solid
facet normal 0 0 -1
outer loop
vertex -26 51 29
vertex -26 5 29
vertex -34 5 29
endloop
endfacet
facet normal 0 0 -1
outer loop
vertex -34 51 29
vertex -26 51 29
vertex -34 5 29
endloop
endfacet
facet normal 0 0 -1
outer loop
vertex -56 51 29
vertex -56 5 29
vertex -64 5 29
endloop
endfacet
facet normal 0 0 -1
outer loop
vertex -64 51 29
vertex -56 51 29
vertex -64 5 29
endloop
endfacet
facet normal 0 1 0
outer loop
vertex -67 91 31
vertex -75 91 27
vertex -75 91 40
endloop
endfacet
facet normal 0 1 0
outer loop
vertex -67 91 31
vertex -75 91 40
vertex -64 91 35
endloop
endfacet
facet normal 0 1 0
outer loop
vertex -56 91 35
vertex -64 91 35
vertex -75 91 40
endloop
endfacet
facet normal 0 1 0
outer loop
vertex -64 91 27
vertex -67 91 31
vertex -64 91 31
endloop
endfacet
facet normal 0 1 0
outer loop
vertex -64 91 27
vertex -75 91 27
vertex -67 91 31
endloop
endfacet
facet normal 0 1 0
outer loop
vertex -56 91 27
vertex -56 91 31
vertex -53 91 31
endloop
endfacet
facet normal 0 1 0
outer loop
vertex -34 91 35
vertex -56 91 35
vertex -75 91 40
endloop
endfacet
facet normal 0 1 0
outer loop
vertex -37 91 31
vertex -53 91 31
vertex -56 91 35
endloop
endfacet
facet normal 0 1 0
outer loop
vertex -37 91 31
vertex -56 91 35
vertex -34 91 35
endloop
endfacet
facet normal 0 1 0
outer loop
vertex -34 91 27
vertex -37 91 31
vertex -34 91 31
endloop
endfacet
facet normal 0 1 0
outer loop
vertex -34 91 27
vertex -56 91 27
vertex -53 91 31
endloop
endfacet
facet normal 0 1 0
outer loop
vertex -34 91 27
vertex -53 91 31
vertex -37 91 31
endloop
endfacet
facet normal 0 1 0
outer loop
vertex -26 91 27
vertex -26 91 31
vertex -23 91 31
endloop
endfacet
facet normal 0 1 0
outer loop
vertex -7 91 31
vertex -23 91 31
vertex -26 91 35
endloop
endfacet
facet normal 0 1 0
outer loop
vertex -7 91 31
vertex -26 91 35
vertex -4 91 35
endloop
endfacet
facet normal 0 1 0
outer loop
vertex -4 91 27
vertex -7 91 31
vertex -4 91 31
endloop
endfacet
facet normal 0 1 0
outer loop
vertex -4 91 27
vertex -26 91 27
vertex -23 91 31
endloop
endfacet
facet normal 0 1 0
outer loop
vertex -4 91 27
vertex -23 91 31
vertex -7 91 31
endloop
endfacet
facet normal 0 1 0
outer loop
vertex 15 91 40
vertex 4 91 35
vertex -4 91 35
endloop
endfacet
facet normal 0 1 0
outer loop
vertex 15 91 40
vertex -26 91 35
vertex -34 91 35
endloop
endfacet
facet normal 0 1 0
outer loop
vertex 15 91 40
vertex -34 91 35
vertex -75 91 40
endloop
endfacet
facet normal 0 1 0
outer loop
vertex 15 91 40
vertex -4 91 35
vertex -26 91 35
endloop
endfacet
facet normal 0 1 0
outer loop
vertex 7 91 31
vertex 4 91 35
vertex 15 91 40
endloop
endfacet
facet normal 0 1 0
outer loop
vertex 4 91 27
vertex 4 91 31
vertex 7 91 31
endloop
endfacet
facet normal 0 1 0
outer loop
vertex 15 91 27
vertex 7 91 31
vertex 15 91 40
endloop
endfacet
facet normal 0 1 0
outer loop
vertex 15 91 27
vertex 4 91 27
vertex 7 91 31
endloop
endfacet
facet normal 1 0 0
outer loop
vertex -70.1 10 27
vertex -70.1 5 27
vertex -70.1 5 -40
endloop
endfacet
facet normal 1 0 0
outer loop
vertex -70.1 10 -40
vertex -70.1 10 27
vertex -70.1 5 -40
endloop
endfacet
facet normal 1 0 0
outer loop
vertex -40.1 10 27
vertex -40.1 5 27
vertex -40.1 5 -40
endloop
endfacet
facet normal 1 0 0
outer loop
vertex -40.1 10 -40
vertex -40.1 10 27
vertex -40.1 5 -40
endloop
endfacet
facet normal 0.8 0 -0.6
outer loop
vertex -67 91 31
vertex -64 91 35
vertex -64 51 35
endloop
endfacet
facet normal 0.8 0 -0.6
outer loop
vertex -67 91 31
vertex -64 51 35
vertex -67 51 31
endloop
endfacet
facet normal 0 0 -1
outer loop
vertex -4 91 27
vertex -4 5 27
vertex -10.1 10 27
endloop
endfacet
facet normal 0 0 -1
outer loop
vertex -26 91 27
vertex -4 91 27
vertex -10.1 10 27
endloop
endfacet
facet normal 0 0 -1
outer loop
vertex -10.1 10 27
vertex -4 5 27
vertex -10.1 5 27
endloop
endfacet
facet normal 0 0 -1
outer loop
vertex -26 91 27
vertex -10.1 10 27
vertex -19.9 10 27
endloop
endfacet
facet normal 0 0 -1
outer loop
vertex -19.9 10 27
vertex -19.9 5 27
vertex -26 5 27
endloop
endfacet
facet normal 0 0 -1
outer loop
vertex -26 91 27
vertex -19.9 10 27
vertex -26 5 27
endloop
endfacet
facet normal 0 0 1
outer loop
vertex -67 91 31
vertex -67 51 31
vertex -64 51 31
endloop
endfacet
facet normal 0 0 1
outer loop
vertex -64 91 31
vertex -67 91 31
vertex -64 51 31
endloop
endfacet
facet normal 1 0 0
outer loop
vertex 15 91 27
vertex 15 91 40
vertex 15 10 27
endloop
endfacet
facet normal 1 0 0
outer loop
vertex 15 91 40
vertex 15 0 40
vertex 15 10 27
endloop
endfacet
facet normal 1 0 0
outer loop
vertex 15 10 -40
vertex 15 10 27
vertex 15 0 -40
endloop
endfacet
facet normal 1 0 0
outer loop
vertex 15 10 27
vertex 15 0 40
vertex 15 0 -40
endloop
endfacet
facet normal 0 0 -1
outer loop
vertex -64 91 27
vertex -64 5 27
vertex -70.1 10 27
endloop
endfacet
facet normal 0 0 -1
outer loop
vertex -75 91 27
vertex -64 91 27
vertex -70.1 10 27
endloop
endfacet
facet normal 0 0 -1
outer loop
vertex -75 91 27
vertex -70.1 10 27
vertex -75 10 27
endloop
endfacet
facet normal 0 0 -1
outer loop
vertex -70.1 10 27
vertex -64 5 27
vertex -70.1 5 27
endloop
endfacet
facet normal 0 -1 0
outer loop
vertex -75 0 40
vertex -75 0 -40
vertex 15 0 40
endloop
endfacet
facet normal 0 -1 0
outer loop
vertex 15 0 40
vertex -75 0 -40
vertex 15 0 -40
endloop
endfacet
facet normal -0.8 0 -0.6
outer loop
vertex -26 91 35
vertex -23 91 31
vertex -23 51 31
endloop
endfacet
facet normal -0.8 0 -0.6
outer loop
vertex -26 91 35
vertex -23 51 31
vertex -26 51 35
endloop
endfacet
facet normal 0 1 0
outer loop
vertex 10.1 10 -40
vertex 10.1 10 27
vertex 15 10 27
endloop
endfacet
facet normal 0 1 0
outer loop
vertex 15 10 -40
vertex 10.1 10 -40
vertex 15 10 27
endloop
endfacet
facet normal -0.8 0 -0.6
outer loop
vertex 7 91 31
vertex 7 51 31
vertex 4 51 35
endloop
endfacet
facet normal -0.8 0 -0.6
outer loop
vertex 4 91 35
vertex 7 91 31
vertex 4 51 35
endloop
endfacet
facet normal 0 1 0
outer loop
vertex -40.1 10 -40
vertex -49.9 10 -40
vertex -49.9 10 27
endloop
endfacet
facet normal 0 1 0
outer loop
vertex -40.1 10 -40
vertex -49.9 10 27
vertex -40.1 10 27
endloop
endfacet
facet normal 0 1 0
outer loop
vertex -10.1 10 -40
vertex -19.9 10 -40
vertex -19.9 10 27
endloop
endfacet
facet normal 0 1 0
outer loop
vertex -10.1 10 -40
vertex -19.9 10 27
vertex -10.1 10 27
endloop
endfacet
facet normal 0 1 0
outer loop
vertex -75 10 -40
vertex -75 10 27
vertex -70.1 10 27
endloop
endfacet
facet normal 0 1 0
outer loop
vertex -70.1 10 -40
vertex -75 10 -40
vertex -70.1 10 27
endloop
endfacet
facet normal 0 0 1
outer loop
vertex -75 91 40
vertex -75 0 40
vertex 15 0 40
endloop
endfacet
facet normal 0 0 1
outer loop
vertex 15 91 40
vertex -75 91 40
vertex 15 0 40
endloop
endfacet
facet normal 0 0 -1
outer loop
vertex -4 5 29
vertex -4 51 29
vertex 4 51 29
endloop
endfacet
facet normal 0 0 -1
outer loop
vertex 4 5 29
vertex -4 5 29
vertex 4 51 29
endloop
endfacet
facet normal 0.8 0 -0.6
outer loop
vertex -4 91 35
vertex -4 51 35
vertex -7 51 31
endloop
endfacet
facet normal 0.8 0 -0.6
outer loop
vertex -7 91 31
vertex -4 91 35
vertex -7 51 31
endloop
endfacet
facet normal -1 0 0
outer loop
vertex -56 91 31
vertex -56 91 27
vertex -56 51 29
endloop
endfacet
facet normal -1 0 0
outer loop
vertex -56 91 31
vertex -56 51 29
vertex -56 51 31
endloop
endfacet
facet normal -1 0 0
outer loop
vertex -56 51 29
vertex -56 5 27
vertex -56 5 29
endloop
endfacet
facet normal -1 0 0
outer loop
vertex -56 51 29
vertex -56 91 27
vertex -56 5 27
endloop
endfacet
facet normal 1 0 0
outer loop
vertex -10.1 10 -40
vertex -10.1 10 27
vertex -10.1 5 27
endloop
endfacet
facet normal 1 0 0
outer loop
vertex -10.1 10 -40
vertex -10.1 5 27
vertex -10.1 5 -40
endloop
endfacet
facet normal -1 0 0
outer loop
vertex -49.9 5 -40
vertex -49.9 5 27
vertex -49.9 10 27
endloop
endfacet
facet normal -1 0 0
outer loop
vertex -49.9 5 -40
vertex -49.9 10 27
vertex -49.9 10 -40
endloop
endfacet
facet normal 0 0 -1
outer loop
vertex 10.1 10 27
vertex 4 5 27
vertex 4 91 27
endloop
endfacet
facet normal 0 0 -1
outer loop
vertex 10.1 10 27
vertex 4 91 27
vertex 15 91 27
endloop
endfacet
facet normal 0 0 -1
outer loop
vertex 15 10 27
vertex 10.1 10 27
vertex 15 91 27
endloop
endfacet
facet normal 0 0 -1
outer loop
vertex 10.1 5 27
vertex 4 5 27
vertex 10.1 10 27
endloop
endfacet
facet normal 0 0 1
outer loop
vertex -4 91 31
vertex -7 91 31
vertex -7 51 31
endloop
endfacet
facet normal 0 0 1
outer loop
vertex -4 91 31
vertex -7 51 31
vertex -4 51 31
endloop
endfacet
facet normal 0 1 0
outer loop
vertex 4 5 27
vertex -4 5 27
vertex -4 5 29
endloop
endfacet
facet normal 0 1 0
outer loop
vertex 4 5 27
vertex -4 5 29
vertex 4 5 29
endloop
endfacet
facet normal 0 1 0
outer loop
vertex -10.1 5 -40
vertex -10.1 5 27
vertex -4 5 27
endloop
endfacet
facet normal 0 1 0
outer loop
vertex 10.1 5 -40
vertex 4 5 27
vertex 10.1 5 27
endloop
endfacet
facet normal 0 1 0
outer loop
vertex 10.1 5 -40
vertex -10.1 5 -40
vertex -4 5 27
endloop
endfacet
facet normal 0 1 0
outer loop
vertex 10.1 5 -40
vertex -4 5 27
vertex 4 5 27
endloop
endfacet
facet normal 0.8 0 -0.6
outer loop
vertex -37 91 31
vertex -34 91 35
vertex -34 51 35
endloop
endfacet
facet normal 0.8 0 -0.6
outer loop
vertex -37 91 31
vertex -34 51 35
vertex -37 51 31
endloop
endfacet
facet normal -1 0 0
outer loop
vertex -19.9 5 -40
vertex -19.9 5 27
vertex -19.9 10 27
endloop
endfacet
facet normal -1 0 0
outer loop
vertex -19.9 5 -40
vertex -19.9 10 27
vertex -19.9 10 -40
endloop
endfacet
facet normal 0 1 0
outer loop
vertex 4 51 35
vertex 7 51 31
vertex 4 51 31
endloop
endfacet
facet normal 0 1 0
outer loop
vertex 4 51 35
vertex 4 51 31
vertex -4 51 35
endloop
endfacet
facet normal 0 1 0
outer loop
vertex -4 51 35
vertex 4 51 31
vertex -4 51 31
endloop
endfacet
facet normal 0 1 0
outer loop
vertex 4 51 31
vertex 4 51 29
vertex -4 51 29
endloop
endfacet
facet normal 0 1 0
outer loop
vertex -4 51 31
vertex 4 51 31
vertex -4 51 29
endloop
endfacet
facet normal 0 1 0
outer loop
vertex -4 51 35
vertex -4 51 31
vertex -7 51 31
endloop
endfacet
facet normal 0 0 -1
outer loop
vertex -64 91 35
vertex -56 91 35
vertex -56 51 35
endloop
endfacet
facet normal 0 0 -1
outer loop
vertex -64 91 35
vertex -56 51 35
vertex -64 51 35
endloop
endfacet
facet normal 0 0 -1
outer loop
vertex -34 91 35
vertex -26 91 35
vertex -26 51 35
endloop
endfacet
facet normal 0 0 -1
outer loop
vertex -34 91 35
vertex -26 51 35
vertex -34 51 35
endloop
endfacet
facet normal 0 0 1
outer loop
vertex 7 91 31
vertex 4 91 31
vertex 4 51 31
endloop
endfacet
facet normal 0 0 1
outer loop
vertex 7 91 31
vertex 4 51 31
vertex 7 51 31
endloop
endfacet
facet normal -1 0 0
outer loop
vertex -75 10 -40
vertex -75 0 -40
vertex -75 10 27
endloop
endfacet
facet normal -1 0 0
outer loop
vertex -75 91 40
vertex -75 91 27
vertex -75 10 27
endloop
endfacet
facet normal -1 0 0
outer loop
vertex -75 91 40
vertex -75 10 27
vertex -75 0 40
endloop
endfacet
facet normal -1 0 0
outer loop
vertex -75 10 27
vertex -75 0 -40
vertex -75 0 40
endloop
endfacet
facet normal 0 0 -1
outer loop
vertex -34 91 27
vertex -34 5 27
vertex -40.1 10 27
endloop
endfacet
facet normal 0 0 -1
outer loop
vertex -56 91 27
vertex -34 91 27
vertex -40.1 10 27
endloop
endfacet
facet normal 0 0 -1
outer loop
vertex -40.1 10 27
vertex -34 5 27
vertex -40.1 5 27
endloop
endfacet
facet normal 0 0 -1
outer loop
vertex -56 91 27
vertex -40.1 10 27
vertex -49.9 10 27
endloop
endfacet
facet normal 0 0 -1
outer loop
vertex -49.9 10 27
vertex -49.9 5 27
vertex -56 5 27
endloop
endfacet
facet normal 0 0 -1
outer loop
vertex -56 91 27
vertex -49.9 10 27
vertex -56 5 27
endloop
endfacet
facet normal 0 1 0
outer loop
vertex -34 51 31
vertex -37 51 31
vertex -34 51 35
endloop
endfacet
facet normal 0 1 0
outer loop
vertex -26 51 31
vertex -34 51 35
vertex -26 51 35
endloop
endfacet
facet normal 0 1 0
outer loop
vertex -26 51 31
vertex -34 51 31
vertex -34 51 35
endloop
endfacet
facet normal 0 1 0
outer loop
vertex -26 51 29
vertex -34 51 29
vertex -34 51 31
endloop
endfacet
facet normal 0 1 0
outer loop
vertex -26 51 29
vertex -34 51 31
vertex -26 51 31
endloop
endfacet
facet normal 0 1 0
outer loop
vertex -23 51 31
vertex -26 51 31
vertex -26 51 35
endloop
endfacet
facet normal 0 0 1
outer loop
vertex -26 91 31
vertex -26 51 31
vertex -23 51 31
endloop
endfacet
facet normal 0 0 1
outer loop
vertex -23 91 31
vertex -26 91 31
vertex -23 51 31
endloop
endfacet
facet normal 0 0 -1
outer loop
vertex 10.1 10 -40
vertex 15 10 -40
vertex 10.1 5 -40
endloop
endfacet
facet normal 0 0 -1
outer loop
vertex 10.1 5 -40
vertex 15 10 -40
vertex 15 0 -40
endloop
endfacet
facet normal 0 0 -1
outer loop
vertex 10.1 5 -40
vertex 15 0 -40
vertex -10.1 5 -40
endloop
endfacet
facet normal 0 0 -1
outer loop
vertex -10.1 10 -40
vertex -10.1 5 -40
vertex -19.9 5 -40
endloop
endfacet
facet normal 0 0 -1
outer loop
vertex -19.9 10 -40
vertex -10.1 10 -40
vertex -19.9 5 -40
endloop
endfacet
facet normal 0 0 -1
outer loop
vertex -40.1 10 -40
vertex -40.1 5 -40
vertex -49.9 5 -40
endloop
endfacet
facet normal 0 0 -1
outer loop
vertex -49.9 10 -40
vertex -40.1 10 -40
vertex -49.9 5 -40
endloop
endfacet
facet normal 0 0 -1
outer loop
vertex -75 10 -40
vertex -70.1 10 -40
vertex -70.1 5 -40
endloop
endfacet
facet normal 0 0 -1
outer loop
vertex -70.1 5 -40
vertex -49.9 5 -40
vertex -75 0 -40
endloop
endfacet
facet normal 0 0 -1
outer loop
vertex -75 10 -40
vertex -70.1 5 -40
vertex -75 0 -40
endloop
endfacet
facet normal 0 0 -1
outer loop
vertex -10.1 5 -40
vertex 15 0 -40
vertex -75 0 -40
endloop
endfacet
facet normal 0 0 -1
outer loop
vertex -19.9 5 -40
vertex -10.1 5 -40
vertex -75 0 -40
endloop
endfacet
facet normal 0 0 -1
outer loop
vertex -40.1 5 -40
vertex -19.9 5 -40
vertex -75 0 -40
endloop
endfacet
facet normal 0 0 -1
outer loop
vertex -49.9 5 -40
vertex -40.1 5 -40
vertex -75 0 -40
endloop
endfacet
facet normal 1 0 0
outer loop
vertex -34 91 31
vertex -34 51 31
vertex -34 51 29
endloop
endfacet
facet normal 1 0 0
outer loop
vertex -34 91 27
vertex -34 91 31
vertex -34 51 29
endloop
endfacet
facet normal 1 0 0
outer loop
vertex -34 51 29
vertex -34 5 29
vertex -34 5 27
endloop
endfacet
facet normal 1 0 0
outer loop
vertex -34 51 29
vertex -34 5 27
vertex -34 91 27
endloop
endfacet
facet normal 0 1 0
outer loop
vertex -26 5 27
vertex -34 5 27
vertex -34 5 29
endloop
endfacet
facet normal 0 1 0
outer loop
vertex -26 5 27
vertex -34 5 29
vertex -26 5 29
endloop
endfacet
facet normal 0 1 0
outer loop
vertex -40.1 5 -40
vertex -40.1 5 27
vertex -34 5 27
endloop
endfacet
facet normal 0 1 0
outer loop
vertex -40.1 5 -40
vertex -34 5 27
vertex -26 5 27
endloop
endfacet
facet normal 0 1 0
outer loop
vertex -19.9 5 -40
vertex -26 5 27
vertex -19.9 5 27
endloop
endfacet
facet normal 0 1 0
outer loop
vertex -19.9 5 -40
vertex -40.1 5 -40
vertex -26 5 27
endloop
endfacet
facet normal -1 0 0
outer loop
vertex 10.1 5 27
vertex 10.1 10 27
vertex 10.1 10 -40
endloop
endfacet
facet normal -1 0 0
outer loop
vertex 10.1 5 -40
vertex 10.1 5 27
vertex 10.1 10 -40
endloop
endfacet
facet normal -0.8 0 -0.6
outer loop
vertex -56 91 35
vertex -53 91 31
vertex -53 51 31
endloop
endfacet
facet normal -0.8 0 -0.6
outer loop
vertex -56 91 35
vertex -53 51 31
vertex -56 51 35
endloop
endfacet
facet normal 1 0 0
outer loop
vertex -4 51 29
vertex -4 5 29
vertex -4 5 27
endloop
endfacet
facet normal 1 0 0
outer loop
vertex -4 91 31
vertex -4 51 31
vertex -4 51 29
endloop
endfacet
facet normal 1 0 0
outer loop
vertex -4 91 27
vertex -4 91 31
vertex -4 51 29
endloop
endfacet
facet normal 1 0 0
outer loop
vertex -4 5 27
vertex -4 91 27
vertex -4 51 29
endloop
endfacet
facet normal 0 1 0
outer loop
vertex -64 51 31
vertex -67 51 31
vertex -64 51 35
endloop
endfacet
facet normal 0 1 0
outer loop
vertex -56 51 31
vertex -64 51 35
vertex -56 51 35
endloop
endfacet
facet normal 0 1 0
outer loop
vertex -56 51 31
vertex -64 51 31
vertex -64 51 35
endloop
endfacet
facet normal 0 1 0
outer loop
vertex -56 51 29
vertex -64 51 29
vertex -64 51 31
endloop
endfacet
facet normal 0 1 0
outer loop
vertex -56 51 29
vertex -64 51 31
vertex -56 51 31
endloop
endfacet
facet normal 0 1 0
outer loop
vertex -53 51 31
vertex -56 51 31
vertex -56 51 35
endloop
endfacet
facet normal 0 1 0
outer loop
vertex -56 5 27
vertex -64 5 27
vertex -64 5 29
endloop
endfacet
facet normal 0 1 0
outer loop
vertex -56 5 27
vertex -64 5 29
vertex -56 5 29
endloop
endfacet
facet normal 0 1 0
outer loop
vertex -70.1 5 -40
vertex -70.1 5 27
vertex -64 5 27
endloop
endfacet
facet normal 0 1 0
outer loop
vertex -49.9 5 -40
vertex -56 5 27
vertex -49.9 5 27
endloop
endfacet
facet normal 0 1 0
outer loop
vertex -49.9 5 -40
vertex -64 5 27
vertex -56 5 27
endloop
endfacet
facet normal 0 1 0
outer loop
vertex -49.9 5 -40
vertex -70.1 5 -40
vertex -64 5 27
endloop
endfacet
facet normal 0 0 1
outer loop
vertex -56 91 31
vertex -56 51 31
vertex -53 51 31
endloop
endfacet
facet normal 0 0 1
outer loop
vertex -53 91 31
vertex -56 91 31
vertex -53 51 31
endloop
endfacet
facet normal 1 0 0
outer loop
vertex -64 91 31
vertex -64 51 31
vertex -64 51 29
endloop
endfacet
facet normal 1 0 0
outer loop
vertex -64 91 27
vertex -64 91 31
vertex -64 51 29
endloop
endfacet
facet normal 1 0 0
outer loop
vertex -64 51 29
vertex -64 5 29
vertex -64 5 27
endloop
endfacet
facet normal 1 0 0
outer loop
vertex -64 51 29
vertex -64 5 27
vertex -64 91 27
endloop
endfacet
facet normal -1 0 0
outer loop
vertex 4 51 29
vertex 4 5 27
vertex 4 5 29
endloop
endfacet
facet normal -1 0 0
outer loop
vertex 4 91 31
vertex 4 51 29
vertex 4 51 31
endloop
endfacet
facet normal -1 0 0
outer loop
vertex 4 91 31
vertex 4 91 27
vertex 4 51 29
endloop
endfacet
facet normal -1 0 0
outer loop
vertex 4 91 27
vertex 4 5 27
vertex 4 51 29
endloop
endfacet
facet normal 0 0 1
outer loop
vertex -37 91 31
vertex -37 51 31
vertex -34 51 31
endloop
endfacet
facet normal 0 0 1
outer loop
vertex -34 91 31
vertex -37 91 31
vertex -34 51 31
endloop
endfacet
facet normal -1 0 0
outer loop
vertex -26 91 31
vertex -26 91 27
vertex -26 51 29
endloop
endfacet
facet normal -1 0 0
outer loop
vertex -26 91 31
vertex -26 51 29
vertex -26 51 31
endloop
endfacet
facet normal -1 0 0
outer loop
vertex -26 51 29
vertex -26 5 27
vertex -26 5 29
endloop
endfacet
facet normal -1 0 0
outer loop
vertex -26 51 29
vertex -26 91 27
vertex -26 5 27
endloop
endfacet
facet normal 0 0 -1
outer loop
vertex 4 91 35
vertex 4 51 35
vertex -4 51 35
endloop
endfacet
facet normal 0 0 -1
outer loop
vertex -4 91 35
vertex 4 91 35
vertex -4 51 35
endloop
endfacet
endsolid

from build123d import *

# Parameters (mm, degrees)
SKETCH1_W           = 30
SKETCH1_H           = 80
BOSS_EXTRUDE1_DEPTH = 10
SKETCH2_W           = 30
SKETCH2_H           = 13
BOSS_EXTRUDE2_DEPTH = 81
CUT_EXTRUDE1_DEPTH  = 40
SKETCH4_W           = 20.2
SKETCH4_H           = 67
CUT_EXTRUDE2_DEPTH  = 5
SKETCH5_W           = 8
SKETCH5_H           = 2
CUT_EXTRUDE3_DEPTH  = 46
LPATTERN1_COUNT     = 3
LPATTERN1_PITCH     = 30


with BuildPart() as part:
    # Sketch1 → Boss-Extrude1 (new body)
    with BuildSketch(Plane(origin=(0, 0, 0), x_dir=(1, 0, 0), z_dir=(0, 1, 0))):
        Rectangle(SKETCH1_W, SKETCH1_H)
    boss_extrude1 = extrude(amount=BOSS_EXTRUDE1_DEPTH)

    # Sketch2 → Boss-Extrude2 (add)
    with BuildSketch(Plane(origin=(0, 10, 0), x_dir=(1, 0, 0), z_dir=(0, 1, 0))):
        with Locations((0, -33.5)):
            Rectangle(SKETCH2_W, SKETCH2_H)
    boss_extrude2 = extrude(amount=BOSS_EXTRUDE2_DEPTH)

    # Sketch3 → Cut-Extrude1 (cut)
    with BuildSketch(Plane(origin=(0, 91, 0), x_dir=(1, 0, 0), z_dir=(0, 1, 0))):
        Polygon((-4, -27), (4, -27), (4, -31), (7, -31), (4, -35), (-4, -35), (-7, -31), (-4, -31), align=None)
    cut_extrude1 = extrude(amount=-CUT_EXTRUDE1_DEPTH, mode=Mode.SUBTRACT)

    # Sketch4 → Cut-Extrude2 (cut)
    with BuildSketch(Plane(origin=(0, 10, 0), x_dir=(1, 0, 0), z_dir=(0, 1, 0))):
        with Locations((0, 6.5)):
            Rectangle(SKETCH4_W, SKETCH4_H)
    cut_extrude2 = extrude(amount=-CUT_EXTRUDE2_DEPTH, mode=Mode.SUBTRACT)

    # Sketch5 → Cut-Extrude3 (cut)
    with BuildSketch(Plane(origin=(0, 51, 0), x_dir=(1, 0, 0), z_dir=(0, 1, 0))):
        with Locations((0, -28)):
            Rectangle(SKETCH5_W, SKETCH5_H)
    cut_extrude3 = extrude(amount=-CUT_EXTRUDE3_DEPTH, mode=Mode.SUBTRACT)

    # LPattern1: Boss-Extrude1, Boss-Extrude2, Cut-Extrude1, Cut-Extrude2, Cut-Extrude3 ×3
    with Locations(*[(-i * LPATTERN1_PITCH, 0, 0) for i in range(1, LPATTERN1_COUNT)]):
        add(boss_extrude1)
        add(boss_extrude2)
        add(cut_extrude1, mode=Mode.SUBTRACT)
        add(cut_extrude2, mode=Mode.SUBTRACT)
        add(cut_extrude3, mode=Mode.SUBTRACT)


solid = part.part
